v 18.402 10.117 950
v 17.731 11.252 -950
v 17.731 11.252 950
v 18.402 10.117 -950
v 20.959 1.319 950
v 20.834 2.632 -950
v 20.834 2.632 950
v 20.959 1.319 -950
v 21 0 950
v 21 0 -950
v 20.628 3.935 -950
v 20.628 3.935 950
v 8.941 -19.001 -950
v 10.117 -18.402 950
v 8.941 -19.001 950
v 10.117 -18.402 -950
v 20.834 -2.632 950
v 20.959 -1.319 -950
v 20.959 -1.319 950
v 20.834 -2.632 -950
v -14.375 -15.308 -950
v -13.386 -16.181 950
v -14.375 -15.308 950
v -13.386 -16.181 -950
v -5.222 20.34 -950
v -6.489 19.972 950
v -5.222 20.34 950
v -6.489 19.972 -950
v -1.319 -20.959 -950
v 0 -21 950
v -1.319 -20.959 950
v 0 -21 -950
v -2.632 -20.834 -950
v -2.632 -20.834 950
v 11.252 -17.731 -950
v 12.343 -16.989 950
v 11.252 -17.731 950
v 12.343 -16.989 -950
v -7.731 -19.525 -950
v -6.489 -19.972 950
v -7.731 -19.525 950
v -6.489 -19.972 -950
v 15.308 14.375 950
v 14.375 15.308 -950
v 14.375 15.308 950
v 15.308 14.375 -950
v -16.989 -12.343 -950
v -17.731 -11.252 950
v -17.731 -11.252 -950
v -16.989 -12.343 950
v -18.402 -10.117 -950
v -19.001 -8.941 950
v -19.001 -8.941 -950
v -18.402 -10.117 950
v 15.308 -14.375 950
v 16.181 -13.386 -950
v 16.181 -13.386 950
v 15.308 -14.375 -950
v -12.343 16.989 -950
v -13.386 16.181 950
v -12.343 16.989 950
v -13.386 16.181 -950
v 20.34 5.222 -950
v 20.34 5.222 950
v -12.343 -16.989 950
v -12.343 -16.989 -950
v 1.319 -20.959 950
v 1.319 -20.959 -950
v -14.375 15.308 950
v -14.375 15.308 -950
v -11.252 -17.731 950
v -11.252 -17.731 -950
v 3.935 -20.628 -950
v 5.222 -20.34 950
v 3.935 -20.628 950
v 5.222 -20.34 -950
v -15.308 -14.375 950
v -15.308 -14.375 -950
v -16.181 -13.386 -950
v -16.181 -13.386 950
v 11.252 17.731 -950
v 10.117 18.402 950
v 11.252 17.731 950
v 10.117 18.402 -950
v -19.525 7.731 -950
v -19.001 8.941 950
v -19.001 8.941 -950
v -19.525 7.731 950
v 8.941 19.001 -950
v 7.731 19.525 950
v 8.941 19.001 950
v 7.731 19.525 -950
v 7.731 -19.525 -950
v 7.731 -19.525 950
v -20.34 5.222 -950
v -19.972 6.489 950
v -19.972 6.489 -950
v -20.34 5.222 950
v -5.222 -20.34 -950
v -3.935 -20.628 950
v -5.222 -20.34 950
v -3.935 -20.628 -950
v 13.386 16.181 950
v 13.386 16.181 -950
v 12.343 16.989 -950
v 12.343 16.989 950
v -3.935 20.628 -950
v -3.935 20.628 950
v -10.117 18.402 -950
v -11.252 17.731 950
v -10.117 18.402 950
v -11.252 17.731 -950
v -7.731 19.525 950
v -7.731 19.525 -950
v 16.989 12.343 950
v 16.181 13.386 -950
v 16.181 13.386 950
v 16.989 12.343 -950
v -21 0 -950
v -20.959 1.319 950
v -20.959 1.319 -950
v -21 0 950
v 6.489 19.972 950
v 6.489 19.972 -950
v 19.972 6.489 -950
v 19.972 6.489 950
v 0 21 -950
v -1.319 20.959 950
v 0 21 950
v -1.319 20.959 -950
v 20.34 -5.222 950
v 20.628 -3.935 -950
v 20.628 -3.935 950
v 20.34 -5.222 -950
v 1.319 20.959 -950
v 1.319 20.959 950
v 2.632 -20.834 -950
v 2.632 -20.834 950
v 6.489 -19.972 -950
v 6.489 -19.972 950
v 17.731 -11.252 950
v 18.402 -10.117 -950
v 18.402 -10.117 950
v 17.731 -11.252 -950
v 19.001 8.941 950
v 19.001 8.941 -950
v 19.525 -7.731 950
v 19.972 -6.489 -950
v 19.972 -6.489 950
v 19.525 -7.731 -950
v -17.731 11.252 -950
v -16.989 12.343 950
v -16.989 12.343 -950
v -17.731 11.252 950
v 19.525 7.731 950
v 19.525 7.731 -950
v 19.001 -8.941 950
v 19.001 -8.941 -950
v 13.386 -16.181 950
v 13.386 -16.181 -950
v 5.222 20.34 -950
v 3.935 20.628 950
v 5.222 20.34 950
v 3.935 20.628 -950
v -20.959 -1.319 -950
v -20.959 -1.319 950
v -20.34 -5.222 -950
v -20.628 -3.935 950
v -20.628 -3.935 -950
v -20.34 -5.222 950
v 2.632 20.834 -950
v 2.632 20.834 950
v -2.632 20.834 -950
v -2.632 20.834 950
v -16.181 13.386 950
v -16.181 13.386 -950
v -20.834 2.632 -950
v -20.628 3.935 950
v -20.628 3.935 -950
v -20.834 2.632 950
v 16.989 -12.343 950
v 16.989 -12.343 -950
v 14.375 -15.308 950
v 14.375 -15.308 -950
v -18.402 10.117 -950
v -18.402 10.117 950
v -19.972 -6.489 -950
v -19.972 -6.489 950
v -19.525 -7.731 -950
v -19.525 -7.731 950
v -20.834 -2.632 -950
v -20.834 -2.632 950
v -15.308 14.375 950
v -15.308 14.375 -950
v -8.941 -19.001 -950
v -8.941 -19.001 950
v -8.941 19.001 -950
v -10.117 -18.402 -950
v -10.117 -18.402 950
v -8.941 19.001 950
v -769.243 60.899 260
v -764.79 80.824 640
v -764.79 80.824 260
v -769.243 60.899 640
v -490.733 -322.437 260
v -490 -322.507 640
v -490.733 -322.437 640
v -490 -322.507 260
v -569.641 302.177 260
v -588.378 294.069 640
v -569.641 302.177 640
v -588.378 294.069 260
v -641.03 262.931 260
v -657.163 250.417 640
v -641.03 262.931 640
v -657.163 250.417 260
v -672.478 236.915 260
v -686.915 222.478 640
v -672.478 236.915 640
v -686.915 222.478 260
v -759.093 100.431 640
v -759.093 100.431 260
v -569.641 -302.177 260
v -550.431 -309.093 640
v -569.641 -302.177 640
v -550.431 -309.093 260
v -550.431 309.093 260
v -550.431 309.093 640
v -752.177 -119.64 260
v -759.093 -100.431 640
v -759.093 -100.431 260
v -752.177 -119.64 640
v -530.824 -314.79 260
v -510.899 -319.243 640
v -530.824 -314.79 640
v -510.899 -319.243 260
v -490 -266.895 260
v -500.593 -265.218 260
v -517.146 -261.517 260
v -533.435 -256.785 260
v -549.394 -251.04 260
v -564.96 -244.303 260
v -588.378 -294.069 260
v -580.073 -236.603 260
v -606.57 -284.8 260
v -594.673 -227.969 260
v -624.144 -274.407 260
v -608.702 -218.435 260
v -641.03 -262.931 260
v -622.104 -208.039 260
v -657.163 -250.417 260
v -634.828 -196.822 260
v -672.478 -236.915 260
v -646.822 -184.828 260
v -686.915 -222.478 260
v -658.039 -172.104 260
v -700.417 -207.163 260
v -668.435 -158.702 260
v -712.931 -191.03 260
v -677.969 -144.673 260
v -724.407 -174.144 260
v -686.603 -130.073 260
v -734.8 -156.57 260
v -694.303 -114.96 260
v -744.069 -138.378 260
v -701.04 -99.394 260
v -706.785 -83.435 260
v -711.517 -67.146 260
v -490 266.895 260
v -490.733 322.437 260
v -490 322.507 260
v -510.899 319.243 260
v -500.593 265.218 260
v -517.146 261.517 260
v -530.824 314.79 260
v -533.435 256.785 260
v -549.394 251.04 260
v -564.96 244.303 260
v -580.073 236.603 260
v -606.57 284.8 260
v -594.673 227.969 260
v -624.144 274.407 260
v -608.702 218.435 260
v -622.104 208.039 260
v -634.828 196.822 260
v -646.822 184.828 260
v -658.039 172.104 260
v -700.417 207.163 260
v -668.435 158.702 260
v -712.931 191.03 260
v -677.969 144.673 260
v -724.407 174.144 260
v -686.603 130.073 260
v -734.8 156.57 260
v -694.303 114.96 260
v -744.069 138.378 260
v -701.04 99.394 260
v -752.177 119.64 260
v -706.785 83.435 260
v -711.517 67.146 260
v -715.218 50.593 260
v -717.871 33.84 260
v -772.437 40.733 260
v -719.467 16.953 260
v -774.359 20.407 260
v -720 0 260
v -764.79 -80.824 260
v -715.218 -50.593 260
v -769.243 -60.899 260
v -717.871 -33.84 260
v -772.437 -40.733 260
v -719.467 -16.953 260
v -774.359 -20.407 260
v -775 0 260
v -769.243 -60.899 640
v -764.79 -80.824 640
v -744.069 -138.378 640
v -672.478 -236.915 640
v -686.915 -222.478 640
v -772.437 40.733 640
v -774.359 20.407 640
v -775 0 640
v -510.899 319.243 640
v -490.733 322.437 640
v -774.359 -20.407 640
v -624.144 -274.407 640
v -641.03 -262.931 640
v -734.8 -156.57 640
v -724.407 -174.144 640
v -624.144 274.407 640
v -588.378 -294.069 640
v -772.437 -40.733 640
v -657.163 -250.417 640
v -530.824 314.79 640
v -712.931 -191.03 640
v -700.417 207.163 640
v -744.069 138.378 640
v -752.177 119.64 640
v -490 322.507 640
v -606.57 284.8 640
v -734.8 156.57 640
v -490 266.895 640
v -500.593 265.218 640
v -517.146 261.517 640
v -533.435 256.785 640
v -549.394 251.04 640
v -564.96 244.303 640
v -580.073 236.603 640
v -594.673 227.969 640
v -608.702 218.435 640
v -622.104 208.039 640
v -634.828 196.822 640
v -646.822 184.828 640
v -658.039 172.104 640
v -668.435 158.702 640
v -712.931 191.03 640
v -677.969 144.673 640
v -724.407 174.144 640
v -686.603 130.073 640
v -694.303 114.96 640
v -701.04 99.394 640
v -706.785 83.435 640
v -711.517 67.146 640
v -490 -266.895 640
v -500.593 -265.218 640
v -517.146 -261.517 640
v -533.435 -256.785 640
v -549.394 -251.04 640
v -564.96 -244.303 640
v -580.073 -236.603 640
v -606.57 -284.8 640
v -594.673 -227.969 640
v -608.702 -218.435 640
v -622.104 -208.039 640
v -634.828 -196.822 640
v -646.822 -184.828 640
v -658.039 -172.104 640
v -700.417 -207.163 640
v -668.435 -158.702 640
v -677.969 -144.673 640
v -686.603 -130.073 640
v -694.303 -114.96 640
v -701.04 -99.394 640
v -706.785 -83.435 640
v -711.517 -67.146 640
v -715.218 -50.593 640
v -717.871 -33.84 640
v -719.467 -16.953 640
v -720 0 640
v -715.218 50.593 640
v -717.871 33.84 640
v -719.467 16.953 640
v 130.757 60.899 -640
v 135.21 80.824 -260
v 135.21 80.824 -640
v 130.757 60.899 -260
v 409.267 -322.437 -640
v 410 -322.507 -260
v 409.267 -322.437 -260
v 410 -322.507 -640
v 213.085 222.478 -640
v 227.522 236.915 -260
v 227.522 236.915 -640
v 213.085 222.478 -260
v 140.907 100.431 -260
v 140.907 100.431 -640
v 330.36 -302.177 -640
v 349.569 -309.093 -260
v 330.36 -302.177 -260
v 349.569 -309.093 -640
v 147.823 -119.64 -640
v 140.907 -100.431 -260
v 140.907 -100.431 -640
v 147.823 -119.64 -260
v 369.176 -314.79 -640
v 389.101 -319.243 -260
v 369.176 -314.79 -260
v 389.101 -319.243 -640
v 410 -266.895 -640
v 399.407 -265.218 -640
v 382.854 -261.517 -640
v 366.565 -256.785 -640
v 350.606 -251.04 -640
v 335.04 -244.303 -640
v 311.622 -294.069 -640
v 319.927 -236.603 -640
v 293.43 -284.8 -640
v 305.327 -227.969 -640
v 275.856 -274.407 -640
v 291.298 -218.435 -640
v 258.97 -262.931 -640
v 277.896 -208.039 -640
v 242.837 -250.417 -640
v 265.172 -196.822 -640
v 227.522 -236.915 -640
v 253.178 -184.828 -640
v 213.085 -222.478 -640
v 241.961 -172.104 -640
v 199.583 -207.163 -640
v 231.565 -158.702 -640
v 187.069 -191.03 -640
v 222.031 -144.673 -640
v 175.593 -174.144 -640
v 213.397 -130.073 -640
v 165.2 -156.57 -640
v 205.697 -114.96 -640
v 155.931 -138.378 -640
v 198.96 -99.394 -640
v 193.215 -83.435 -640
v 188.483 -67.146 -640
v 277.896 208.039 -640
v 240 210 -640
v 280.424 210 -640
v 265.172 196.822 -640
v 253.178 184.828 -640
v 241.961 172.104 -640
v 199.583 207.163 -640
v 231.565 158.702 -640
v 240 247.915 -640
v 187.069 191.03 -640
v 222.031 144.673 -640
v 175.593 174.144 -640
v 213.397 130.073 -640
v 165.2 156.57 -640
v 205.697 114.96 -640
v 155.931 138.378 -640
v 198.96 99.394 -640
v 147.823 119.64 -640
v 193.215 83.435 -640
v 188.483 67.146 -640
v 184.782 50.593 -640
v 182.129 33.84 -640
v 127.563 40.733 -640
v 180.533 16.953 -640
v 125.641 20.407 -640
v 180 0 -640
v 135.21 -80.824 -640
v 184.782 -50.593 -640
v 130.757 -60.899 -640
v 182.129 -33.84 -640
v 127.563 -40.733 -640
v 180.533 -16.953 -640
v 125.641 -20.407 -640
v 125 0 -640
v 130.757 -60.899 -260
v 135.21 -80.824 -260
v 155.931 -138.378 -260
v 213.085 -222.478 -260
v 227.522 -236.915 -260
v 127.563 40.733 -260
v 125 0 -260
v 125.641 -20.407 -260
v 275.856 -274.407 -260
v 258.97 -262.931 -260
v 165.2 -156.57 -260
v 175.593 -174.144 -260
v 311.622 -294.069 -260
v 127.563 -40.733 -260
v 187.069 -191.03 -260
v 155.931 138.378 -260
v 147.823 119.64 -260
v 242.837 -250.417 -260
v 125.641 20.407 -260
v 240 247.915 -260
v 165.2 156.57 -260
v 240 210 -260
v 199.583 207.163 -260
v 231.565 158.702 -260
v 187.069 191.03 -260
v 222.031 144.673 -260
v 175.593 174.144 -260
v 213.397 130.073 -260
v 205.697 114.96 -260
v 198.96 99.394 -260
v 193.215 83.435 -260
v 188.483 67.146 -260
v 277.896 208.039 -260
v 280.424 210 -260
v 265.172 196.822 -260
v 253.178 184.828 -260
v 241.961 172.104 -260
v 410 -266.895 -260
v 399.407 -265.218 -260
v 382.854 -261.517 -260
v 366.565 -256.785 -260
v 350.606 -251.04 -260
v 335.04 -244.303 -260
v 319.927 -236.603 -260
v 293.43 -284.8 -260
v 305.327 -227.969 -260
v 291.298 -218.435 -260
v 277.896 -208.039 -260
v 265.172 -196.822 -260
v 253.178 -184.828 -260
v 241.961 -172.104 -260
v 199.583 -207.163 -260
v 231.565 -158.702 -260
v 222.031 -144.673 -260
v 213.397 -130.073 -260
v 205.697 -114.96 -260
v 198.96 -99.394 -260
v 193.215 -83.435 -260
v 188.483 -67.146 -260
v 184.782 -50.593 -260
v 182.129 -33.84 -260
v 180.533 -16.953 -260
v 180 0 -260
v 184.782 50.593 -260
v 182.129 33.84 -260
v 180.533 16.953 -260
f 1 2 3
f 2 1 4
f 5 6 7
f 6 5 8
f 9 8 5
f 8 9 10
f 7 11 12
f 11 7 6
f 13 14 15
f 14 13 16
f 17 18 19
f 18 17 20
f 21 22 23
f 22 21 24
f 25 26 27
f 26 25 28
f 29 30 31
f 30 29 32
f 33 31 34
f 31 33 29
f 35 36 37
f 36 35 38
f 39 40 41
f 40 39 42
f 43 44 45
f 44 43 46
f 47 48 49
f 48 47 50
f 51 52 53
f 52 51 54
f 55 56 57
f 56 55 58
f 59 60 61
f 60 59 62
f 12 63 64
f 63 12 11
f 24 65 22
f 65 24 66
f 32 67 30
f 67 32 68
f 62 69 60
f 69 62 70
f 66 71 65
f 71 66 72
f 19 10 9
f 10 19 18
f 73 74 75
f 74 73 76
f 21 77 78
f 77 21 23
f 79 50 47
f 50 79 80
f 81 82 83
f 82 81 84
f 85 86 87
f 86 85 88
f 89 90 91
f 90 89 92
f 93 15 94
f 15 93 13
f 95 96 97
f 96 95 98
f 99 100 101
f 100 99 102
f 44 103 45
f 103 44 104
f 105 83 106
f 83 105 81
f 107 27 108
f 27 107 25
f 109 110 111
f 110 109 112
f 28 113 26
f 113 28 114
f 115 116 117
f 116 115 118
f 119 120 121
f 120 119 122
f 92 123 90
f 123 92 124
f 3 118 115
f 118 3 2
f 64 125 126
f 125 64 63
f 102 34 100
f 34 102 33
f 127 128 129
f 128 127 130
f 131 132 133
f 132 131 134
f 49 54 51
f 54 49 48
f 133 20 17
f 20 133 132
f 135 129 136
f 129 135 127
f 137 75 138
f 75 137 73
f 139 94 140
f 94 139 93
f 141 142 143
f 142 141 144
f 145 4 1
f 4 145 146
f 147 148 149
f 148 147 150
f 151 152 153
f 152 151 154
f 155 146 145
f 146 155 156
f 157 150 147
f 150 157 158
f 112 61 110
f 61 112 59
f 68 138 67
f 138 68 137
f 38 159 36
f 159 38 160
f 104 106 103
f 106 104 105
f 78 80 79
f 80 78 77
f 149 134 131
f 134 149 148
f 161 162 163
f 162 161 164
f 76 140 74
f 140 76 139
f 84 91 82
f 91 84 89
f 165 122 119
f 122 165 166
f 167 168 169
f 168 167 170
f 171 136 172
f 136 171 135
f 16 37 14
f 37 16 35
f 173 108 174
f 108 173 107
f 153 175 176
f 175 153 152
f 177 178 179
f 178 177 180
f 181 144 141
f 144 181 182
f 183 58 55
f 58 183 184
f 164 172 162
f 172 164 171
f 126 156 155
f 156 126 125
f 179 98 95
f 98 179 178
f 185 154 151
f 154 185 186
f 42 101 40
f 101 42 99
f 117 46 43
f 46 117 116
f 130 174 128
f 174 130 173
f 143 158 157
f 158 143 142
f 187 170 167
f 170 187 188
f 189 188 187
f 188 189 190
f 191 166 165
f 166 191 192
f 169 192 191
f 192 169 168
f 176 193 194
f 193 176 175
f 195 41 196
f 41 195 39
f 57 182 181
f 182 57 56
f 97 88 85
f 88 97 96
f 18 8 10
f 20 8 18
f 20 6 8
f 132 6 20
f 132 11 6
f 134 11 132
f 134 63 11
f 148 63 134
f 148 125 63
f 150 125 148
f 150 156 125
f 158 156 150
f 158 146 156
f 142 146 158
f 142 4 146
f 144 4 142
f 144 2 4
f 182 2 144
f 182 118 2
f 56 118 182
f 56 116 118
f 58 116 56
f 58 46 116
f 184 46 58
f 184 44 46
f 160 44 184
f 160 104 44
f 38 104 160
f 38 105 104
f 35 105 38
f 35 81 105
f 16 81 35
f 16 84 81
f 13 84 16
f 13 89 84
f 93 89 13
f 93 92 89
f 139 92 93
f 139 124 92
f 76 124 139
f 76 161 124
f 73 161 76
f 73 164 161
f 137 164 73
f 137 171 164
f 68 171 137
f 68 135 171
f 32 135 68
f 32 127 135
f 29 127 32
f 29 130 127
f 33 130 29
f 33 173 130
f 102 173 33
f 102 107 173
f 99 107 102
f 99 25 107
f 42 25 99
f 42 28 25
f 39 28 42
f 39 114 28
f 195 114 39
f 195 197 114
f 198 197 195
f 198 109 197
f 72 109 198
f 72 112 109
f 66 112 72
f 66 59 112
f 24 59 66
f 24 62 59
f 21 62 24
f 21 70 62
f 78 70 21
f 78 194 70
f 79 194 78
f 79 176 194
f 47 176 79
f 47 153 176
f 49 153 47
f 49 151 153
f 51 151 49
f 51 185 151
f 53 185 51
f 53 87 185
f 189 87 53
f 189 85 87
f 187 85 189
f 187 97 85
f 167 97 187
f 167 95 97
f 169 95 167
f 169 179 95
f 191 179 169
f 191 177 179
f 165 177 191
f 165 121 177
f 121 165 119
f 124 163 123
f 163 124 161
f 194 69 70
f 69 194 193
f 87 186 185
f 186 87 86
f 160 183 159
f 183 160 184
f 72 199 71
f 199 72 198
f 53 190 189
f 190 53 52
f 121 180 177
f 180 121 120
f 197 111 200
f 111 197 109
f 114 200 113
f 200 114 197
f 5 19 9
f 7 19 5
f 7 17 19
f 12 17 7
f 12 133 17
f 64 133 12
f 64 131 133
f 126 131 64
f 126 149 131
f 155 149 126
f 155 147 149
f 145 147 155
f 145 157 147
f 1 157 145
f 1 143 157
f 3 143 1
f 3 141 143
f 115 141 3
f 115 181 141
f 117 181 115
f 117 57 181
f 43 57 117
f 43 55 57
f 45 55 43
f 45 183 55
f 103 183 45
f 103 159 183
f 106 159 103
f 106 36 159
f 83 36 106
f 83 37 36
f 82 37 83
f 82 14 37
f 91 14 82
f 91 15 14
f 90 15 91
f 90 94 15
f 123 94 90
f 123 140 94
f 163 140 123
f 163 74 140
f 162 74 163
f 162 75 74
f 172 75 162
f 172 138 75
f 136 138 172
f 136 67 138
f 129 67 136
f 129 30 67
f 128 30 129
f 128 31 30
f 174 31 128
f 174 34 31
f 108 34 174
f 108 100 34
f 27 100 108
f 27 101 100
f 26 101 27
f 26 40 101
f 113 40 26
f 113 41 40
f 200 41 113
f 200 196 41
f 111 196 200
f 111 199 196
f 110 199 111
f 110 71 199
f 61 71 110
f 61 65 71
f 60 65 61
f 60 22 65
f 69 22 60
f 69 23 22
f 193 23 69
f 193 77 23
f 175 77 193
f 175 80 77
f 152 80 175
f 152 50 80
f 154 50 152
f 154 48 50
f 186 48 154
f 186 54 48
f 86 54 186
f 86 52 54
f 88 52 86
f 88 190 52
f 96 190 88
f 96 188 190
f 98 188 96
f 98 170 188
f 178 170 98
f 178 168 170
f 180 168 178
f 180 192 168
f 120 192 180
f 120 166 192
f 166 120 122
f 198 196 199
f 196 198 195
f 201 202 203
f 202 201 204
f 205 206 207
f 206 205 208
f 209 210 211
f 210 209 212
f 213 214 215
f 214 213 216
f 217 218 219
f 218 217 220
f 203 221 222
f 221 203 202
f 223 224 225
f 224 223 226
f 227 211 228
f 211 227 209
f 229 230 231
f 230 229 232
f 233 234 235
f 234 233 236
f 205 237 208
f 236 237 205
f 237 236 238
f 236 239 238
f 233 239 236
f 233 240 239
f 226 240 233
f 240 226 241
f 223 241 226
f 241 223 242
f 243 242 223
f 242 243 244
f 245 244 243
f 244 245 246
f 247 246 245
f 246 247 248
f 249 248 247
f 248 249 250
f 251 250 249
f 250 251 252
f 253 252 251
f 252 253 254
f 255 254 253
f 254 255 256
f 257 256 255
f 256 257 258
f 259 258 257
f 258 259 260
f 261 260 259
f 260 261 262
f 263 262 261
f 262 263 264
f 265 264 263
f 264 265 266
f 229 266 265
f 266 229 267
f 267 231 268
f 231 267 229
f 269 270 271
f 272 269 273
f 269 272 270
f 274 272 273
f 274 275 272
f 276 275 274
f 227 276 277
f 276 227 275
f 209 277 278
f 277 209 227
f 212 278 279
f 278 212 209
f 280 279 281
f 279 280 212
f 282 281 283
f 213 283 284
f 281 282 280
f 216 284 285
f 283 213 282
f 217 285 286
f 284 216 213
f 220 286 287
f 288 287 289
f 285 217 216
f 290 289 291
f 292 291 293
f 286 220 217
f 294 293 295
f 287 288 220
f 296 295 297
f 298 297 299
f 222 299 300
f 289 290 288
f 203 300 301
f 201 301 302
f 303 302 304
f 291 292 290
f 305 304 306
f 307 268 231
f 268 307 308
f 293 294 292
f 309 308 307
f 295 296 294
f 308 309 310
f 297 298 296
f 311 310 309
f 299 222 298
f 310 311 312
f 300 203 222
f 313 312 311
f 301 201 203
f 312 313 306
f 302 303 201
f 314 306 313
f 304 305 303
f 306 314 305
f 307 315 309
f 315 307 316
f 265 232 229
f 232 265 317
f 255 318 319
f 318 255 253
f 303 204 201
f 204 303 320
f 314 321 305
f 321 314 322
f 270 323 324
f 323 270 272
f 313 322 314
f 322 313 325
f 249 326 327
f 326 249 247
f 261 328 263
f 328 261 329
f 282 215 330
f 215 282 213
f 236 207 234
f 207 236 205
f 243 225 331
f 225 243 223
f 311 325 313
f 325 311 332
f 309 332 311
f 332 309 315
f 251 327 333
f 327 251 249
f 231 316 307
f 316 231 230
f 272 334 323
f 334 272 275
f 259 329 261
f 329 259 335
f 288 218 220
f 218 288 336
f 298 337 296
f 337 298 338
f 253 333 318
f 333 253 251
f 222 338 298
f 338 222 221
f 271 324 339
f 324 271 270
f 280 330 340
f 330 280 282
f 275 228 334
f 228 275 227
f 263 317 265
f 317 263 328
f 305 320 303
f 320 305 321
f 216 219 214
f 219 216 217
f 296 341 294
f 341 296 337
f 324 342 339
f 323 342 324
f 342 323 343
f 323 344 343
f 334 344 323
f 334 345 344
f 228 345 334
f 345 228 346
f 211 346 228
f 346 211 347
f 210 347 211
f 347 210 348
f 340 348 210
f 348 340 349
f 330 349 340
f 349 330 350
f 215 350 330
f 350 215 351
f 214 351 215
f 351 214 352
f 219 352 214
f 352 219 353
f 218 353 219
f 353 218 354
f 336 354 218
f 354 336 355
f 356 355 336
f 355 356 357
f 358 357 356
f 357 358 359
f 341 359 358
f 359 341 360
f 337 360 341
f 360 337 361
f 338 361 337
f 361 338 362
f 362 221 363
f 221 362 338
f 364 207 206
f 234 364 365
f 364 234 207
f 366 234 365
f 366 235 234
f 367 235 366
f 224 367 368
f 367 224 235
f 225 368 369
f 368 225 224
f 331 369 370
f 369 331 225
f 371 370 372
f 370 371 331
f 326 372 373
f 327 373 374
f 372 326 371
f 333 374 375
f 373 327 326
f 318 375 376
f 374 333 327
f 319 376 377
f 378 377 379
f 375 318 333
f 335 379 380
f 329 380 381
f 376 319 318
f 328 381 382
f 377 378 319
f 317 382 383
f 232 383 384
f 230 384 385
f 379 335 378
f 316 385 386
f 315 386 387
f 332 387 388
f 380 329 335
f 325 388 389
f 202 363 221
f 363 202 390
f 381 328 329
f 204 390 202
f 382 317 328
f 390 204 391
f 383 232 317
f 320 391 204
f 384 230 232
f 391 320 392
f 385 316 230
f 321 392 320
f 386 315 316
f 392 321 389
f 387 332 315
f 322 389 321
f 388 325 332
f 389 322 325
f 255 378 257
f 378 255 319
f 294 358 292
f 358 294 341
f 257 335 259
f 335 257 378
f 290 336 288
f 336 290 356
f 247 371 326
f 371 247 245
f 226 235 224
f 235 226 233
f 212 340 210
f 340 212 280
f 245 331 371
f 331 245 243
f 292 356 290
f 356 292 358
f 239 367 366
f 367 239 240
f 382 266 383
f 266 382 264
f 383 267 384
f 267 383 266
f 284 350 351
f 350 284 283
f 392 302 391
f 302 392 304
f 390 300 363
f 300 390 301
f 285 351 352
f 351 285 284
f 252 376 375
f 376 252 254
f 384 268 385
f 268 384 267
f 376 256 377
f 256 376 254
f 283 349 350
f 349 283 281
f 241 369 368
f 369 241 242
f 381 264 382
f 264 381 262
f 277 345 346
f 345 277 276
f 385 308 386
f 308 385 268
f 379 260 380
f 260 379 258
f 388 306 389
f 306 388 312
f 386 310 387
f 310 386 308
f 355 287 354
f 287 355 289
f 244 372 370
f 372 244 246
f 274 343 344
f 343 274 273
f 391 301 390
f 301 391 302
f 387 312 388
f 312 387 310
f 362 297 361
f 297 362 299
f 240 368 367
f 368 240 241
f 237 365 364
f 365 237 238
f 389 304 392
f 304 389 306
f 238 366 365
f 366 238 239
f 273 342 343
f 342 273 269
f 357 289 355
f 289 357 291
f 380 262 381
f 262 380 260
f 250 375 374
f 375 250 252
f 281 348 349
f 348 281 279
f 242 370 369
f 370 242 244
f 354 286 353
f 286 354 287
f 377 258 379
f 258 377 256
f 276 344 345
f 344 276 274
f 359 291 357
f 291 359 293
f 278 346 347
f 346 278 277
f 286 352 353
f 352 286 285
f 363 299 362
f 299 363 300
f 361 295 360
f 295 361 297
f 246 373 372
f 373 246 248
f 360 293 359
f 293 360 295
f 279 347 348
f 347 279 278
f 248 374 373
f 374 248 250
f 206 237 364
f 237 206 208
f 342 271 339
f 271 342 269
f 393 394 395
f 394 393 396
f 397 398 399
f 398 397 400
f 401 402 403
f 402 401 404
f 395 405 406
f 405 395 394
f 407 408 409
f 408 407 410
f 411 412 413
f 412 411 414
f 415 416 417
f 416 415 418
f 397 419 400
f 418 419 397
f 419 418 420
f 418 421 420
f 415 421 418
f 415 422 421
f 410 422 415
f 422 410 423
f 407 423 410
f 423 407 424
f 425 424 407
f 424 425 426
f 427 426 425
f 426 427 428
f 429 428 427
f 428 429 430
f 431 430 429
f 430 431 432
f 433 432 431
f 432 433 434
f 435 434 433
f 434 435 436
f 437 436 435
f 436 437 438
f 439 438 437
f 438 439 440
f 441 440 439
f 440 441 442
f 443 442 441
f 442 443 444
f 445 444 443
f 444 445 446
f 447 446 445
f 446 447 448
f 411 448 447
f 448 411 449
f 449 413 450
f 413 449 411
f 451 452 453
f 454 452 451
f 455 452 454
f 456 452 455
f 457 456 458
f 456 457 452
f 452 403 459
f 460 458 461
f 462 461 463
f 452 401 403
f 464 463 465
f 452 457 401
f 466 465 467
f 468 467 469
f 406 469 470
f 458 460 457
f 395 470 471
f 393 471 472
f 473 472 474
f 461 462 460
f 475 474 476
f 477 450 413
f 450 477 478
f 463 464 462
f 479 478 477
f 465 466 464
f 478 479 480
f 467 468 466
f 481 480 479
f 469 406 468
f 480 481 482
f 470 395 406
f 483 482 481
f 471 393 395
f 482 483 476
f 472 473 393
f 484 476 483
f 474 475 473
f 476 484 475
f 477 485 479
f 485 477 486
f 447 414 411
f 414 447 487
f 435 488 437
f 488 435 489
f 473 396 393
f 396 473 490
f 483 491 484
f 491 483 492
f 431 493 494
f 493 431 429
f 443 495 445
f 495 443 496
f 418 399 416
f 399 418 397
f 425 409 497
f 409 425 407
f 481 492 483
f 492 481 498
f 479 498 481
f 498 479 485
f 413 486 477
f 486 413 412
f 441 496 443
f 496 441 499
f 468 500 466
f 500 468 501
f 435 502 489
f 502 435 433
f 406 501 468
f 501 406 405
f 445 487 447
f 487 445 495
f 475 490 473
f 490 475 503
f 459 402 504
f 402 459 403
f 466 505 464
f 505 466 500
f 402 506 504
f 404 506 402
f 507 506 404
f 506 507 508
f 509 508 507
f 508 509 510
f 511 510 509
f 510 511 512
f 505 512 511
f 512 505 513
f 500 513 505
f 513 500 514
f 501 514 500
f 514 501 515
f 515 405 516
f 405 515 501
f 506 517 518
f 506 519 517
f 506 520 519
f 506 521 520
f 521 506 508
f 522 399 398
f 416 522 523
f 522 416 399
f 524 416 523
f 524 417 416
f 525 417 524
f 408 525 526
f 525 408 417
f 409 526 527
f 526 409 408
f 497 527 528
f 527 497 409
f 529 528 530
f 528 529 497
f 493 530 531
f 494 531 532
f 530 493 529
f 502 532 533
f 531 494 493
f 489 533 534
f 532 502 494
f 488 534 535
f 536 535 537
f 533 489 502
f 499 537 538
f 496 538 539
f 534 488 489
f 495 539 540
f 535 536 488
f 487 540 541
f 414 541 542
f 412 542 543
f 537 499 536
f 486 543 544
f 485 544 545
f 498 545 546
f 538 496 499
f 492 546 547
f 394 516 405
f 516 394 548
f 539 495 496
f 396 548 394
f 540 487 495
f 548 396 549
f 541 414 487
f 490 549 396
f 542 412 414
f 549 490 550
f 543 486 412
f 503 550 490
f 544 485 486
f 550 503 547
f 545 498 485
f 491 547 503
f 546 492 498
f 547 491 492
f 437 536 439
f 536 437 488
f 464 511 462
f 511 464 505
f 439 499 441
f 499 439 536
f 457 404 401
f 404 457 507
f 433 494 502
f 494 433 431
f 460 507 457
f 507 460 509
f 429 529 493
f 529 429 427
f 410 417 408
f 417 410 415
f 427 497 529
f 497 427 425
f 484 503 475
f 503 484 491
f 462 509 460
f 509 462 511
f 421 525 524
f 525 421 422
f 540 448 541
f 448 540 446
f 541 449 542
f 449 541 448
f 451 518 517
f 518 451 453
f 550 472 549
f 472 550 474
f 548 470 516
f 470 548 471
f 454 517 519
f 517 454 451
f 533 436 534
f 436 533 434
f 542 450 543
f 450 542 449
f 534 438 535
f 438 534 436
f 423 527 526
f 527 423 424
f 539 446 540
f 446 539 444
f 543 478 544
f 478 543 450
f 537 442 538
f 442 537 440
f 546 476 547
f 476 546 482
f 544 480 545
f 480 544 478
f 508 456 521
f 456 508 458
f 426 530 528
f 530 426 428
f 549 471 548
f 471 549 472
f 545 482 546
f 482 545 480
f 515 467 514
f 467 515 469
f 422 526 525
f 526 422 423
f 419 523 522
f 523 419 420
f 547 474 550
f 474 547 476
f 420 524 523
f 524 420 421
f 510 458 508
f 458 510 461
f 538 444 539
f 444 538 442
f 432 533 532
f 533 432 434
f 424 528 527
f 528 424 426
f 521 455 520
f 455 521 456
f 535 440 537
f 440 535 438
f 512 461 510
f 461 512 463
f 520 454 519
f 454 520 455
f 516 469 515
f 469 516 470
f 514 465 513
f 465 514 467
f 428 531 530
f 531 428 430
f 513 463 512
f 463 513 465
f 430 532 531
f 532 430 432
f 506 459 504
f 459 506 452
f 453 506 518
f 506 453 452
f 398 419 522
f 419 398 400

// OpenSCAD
// ============================================================================
// PROJECT: XXXG-00W0 WING GUNDAM ZERO EW - LOWER LIMB ARTIULATION CORE
// COMPONENT VAULT: BANDAI CAST RUNNER F - KNEE ADAPTERS F7 & F9
// CONFIG SPECS: DUAL-AXIS CYCLOIDAL JOINT SHUNT (1:1 METRIC UP-SCALE)
// PARITY INTERFACE: SLIDING ARMOR TRACKS & EMBEDDED CONDUIT HARNESS CORES
// ============================================================================

$fn = 100; // Circular segment resolution calculation count

// Sizing Constants Scaled 1:1 for a 16.7-Meter Airframe Scale (mm)
adapter_block_height = 760;             // Total vertical thickness of adapter (mm)
cycloidal_bore_diameter = 540;          // Inner cycloidal reduction ring bore (mm)
structural_core_wall = 55;              // Thick TiAl frame reinforcement (mm)
harness_conduit_width = 80;             // Cast-in 4oz copper logic trace track (mm)
tracking_slot_stroke = 420;             // F9 parallel armor sliding guide length (mm)

module Runner_F_Adapter_Forge() {
    // Central Supply Injection Runner Axis (Molten Feed Line from Siphon Forge)
    color([0.24, 0.24, 0.26]) {
        cylinder(h = adapter_block_height * 2.5, d = 42, center = true);
        // Direct injection gates tracking straight into the part mold cavities
        translate() rotate() cylinder(h = 450, d = 22);
        translate([0, 0, -500]) rotate() cylinder(h = 450, d = 22);
    }
    
    // Instantiate Scaled Structural Molds Symmetrically (Left & Right Halves)
    Cast_Internal_Knee_Adapters();
}

module Cast_Internal_Knee_Adapters() {
    // ---- PART F7: LOWER LEFT THIGH KNEE ADAPTER HOUSING ---- [Page 7, Step 5 / Page 7, Step 08-1]
    translate([-450, 0, 450]) color([0.45, 0.45, 0.48]) { // Inner Frame Dark Spec
        difference() {
            // Main high-strength structural adapter collar block
            cylinder(h = adapter_block_height * 0.5, d = cycloidal_bore_diameter + (structural_core_wall * 2), center = true);
            
            // Concentric Internal Boring for the Cycloidal Pin Rolling Tracks
            cylinder(h = adapter_block_height * 0.6, d = cycloidal_bore_diameter, center = true);
            
            // Continuous cast-in routing track for the 4oz solid-state wiring rails
            cube([harness_conduit_width, cycloidal_bore_diameter + 150, adapter_block_height], center = true);
            
            // Slicing profile tool to generate an asymmetrical half-shell part component
            translate([cycloidal_bore_diameter, 0, 0])
                cube([cycloidal_bore_diameter * 2, cycloidal_bore_diameter * 2, adapter_block_height * 2], center = true);
        }
    }
    
    // ---- PART F9: LOWER RIGHT THIGH KNEE ADAPTER WITH GUIDE RAIL ---- [Page 7, Step 5 / Page 7, Step 08-1]
    translate([450, 0, -450]) rotate() color([0.45, 0.45, 0.48]) {
        difference() {
            cylinder(h = adapter_block_height * 0.5, d = cycloidal_bore_diameter + (structural_core_wall * 2), center = true);
            cylinder(h = adapter_block_height * 0.6, d = cycloidal_bore_diameter, center = true);
            
            // Parallel Sliding Tracking Channel for armor sync loops
            translate([0, (cycloidal_bore_diameter/2), 0])
                cube([tracking_slot_stroke, 120, adapter_block_height + 20], center = true);
                
            cube([harness_conduit_width, cycloidal_bore_diameter + 150, adapter_block_height], center = true);
            translate([cycloidal_bore_diameter, 0, 0])
                cube([cycloidal_bore_diameter * 2, cycloidal_bore_diameter * 2, adapter_block_height * 2], center = true);
        }
    }
}

// Render Master Assembly to Parameter Workspace
Runner_F_Adapter_Forge();
